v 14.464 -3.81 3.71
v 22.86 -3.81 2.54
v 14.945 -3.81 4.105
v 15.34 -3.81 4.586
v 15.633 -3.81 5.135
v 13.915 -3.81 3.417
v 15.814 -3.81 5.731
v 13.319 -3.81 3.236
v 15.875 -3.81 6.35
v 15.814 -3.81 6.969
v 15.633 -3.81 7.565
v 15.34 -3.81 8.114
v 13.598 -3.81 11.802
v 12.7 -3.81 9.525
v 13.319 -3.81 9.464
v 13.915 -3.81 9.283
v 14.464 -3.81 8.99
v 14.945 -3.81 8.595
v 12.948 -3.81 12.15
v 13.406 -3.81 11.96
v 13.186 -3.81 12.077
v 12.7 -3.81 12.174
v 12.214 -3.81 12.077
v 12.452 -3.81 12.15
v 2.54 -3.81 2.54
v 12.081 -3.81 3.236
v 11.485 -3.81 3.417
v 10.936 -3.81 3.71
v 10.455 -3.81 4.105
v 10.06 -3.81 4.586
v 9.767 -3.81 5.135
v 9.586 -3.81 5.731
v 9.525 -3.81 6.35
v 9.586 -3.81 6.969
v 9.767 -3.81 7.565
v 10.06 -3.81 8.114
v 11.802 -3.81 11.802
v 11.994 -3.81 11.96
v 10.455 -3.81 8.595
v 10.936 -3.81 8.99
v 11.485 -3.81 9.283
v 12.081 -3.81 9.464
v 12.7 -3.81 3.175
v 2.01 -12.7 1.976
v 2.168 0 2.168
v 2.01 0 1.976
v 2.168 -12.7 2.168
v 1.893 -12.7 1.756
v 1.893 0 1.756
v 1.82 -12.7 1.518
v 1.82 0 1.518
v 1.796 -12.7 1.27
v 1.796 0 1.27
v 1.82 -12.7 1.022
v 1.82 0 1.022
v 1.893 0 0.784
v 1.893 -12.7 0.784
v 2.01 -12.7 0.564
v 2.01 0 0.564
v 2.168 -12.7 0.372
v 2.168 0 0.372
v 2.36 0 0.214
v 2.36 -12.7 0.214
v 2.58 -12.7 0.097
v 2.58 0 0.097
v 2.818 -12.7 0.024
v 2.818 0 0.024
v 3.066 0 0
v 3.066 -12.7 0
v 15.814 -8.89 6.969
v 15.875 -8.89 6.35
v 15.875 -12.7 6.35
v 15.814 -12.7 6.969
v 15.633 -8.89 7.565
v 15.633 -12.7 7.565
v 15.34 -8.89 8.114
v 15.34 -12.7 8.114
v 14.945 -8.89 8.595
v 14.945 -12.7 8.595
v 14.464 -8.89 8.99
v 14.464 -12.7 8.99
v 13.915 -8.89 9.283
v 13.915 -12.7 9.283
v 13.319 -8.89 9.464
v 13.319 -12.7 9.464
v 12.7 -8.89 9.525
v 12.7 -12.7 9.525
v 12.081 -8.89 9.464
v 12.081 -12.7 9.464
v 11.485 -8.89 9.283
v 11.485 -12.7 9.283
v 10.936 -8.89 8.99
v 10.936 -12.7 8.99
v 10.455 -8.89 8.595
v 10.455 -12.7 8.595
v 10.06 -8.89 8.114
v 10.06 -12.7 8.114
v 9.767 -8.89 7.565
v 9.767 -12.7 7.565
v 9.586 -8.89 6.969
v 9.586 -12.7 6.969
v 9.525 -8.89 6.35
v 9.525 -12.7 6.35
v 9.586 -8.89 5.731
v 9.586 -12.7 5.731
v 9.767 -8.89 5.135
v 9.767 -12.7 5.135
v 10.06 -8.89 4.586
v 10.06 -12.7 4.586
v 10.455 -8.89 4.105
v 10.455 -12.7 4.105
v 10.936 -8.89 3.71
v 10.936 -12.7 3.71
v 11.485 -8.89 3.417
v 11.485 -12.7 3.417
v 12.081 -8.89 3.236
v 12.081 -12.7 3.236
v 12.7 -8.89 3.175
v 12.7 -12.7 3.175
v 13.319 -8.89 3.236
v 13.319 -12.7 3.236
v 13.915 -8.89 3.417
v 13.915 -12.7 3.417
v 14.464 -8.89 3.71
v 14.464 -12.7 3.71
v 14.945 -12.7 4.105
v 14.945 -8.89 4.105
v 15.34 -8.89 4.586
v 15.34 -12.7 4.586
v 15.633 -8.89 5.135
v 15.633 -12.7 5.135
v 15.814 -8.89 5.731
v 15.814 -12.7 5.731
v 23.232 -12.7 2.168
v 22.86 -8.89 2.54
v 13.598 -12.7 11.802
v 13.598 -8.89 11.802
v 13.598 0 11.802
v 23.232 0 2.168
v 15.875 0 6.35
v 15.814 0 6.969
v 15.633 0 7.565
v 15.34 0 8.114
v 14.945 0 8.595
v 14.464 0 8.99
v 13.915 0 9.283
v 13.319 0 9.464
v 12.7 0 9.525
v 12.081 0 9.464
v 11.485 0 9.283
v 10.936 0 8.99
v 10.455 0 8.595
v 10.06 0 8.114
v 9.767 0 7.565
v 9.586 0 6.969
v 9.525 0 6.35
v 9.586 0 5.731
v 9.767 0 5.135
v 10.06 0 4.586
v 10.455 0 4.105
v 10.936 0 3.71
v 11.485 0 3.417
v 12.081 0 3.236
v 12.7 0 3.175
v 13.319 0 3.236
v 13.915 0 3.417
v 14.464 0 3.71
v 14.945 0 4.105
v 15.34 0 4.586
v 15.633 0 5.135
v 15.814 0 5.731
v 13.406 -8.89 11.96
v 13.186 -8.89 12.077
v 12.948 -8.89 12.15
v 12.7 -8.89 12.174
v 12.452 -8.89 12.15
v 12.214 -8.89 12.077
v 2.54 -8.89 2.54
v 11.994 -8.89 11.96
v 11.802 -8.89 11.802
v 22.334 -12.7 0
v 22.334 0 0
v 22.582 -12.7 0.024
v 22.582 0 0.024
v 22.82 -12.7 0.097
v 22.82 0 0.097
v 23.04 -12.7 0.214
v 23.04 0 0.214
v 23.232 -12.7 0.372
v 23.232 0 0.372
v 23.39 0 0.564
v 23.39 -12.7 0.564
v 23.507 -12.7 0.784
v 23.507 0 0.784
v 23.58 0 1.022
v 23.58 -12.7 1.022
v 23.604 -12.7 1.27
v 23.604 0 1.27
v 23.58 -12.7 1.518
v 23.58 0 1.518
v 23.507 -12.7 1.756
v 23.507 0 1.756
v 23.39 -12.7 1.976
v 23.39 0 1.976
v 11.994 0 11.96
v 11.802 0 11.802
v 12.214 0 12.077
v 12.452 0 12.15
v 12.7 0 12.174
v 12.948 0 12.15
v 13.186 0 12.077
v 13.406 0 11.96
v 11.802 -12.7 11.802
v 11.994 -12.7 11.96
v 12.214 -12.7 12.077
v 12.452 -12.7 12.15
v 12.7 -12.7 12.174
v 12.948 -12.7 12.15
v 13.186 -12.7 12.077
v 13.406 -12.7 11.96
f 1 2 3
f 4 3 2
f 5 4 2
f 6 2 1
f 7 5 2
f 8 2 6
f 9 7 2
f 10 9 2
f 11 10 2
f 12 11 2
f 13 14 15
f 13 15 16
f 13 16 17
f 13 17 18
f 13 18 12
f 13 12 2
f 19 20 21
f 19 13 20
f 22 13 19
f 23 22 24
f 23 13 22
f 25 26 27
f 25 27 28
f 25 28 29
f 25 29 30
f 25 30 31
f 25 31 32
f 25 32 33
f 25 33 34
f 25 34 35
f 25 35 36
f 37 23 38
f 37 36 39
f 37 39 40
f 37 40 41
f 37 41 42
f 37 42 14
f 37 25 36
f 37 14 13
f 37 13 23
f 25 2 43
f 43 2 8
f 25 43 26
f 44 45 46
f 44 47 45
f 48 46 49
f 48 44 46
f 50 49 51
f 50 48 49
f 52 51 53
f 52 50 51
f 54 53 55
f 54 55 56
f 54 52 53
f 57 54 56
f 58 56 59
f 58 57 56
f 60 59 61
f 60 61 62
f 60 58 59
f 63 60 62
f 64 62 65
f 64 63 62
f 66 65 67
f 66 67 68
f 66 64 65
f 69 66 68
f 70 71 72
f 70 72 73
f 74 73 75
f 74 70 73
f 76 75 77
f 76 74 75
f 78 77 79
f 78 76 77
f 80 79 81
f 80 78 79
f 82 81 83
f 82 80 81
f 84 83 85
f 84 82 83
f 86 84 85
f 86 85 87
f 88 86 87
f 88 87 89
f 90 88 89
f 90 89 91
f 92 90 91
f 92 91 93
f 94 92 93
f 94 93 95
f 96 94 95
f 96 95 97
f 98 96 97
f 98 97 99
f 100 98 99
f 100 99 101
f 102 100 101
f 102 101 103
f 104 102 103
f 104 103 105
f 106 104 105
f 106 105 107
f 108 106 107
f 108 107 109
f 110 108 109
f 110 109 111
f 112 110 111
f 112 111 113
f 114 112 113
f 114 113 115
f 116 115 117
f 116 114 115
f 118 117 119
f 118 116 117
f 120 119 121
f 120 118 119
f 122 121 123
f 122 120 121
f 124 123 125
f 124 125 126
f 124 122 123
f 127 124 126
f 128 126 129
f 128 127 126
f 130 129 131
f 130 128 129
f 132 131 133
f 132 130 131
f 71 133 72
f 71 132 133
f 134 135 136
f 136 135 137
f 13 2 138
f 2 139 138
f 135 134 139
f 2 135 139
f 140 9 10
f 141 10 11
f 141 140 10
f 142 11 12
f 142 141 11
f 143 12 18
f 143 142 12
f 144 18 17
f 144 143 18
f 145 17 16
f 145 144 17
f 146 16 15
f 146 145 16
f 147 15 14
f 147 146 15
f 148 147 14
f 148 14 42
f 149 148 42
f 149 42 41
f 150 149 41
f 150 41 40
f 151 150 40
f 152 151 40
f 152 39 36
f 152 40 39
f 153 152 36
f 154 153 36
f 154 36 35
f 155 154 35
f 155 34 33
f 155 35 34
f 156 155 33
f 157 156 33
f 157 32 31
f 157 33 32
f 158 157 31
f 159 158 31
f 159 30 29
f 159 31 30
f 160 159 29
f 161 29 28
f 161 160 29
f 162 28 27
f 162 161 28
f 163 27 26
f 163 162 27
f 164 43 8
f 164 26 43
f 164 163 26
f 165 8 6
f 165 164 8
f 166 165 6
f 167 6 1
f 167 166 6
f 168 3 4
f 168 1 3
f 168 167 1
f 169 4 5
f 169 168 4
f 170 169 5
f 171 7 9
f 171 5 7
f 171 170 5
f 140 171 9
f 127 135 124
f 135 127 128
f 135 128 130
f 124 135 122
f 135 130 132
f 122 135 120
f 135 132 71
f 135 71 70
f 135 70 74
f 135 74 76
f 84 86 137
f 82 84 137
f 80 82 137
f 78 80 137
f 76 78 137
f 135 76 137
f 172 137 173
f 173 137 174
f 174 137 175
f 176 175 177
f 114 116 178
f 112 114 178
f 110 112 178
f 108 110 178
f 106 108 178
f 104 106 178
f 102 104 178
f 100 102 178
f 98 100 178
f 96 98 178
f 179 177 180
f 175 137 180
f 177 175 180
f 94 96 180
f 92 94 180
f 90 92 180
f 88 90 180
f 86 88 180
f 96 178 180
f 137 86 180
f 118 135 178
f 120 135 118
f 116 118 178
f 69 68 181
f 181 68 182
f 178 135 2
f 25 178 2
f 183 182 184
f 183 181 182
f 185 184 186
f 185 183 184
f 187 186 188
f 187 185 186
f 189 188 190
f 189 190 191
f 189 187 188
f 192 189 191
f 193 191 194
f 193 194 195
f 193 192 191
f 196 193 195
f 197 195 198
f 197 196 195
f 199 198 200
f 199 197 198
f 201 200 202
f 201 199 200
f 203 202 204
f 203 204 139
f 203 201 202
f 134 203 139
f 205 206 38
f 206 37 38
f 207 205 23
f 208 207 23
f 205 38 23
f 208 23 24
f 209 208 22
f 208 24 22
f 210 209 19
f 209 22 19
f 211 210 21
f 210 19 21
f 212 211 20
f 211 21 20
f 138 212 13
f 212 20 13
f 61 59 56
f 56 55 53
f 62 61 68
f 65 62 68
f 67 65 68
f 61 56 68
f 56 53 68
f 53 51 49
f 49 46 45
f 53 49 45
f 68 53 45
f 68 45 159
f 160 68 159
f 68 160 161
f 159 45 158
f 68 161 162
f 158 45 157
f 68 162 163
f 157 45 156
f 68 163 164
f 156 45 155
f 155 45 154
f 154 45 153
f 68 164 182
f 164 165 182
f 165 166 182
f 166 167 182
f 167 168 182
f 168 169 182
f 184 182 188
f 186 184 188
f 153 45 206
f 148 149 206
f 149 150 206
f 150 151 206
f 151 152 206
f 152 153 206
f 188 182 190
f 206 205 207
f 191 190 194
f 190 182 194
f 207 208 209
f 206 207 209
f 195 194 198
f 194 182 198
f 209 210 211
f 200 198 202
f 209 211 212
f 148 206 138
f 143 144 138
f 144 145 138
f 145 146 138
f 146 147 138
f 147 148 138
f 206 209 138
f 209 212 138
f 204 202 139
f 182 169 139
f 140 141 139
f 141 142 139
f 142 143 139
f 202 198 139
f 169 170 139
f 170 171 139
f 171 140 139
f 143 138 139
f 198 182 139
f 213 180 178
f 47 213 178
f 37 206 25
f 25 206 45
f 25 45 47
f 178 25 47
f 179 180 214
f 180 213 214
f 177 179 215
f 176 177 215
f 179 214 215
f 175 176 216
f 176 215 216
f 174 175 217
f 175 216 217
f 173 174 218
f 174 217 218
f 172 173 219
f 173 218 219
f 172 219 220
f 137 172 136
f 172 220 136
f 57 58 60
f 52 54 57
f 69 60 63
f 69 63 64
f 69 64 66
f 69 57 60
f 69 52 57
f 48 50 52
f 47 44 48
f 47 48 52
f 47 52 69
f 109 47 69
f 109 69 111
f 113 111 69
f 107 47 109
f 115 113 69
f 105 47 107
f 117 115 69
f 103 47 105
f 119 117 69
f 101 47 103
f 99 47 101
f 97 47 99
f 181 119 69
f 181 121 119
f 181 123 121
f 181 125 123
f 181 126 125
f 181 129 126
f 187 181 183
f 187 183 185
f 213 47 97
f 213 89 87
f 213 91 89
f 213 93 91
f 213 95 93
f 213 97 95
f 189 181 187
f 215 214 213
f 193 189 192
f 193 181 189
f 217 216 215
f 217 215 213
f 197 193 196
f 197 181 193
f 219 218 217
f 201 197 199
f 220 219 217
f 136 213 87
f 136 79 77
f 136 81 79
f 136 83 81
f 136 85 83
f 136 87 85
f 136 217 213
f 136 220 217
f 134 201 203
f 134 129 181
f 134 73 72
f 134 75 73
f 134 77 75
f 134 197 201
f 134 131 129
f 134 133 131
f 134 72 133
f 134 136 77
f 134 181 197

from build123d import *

# Parameters (mm, degrees)
F0_R     = 3.175
F1_DEPTH = 12.7
F2_W     = 5.08
F2_H     = 10.16
F3_DEPTH = 25.401
F4_R     = 1.27


with BuildPart() as f1:
    # F0 (on Front) → F1 (new body)
    with BuildSketch(Plane.XZ):
        Polygon((12.7, 12.7), (0, 0), (25.4, 0), align=None)
        with Locations((12.7, 6.35)):
            Circle(F0_R, mode=Mode.SUBTRACT)
    extrude(amount=F1_DEPTH)

    # F2 (on Right) → F3 (cut, through all)
    with BuildSketch(Plane.YZ):
        with Locations((-6.35, 7.62)):
            Rectangle(F2_W, F2_H)
    extrude(amount=F3_DEPTH, mode=Mode.SUBTRACT)

    # F4
    f4_edges = [f1.edges().sort_by_distance(p)[0] for p in [
        (12.7, -10.795, 12.7),
        (12.7, -1.905, 12.7),
        (0, -6.35, 0),
        (25.4, -6.35, 0),
    ]]
    fillet(f4_edges, radius=F4_R)


solid = f1.part
